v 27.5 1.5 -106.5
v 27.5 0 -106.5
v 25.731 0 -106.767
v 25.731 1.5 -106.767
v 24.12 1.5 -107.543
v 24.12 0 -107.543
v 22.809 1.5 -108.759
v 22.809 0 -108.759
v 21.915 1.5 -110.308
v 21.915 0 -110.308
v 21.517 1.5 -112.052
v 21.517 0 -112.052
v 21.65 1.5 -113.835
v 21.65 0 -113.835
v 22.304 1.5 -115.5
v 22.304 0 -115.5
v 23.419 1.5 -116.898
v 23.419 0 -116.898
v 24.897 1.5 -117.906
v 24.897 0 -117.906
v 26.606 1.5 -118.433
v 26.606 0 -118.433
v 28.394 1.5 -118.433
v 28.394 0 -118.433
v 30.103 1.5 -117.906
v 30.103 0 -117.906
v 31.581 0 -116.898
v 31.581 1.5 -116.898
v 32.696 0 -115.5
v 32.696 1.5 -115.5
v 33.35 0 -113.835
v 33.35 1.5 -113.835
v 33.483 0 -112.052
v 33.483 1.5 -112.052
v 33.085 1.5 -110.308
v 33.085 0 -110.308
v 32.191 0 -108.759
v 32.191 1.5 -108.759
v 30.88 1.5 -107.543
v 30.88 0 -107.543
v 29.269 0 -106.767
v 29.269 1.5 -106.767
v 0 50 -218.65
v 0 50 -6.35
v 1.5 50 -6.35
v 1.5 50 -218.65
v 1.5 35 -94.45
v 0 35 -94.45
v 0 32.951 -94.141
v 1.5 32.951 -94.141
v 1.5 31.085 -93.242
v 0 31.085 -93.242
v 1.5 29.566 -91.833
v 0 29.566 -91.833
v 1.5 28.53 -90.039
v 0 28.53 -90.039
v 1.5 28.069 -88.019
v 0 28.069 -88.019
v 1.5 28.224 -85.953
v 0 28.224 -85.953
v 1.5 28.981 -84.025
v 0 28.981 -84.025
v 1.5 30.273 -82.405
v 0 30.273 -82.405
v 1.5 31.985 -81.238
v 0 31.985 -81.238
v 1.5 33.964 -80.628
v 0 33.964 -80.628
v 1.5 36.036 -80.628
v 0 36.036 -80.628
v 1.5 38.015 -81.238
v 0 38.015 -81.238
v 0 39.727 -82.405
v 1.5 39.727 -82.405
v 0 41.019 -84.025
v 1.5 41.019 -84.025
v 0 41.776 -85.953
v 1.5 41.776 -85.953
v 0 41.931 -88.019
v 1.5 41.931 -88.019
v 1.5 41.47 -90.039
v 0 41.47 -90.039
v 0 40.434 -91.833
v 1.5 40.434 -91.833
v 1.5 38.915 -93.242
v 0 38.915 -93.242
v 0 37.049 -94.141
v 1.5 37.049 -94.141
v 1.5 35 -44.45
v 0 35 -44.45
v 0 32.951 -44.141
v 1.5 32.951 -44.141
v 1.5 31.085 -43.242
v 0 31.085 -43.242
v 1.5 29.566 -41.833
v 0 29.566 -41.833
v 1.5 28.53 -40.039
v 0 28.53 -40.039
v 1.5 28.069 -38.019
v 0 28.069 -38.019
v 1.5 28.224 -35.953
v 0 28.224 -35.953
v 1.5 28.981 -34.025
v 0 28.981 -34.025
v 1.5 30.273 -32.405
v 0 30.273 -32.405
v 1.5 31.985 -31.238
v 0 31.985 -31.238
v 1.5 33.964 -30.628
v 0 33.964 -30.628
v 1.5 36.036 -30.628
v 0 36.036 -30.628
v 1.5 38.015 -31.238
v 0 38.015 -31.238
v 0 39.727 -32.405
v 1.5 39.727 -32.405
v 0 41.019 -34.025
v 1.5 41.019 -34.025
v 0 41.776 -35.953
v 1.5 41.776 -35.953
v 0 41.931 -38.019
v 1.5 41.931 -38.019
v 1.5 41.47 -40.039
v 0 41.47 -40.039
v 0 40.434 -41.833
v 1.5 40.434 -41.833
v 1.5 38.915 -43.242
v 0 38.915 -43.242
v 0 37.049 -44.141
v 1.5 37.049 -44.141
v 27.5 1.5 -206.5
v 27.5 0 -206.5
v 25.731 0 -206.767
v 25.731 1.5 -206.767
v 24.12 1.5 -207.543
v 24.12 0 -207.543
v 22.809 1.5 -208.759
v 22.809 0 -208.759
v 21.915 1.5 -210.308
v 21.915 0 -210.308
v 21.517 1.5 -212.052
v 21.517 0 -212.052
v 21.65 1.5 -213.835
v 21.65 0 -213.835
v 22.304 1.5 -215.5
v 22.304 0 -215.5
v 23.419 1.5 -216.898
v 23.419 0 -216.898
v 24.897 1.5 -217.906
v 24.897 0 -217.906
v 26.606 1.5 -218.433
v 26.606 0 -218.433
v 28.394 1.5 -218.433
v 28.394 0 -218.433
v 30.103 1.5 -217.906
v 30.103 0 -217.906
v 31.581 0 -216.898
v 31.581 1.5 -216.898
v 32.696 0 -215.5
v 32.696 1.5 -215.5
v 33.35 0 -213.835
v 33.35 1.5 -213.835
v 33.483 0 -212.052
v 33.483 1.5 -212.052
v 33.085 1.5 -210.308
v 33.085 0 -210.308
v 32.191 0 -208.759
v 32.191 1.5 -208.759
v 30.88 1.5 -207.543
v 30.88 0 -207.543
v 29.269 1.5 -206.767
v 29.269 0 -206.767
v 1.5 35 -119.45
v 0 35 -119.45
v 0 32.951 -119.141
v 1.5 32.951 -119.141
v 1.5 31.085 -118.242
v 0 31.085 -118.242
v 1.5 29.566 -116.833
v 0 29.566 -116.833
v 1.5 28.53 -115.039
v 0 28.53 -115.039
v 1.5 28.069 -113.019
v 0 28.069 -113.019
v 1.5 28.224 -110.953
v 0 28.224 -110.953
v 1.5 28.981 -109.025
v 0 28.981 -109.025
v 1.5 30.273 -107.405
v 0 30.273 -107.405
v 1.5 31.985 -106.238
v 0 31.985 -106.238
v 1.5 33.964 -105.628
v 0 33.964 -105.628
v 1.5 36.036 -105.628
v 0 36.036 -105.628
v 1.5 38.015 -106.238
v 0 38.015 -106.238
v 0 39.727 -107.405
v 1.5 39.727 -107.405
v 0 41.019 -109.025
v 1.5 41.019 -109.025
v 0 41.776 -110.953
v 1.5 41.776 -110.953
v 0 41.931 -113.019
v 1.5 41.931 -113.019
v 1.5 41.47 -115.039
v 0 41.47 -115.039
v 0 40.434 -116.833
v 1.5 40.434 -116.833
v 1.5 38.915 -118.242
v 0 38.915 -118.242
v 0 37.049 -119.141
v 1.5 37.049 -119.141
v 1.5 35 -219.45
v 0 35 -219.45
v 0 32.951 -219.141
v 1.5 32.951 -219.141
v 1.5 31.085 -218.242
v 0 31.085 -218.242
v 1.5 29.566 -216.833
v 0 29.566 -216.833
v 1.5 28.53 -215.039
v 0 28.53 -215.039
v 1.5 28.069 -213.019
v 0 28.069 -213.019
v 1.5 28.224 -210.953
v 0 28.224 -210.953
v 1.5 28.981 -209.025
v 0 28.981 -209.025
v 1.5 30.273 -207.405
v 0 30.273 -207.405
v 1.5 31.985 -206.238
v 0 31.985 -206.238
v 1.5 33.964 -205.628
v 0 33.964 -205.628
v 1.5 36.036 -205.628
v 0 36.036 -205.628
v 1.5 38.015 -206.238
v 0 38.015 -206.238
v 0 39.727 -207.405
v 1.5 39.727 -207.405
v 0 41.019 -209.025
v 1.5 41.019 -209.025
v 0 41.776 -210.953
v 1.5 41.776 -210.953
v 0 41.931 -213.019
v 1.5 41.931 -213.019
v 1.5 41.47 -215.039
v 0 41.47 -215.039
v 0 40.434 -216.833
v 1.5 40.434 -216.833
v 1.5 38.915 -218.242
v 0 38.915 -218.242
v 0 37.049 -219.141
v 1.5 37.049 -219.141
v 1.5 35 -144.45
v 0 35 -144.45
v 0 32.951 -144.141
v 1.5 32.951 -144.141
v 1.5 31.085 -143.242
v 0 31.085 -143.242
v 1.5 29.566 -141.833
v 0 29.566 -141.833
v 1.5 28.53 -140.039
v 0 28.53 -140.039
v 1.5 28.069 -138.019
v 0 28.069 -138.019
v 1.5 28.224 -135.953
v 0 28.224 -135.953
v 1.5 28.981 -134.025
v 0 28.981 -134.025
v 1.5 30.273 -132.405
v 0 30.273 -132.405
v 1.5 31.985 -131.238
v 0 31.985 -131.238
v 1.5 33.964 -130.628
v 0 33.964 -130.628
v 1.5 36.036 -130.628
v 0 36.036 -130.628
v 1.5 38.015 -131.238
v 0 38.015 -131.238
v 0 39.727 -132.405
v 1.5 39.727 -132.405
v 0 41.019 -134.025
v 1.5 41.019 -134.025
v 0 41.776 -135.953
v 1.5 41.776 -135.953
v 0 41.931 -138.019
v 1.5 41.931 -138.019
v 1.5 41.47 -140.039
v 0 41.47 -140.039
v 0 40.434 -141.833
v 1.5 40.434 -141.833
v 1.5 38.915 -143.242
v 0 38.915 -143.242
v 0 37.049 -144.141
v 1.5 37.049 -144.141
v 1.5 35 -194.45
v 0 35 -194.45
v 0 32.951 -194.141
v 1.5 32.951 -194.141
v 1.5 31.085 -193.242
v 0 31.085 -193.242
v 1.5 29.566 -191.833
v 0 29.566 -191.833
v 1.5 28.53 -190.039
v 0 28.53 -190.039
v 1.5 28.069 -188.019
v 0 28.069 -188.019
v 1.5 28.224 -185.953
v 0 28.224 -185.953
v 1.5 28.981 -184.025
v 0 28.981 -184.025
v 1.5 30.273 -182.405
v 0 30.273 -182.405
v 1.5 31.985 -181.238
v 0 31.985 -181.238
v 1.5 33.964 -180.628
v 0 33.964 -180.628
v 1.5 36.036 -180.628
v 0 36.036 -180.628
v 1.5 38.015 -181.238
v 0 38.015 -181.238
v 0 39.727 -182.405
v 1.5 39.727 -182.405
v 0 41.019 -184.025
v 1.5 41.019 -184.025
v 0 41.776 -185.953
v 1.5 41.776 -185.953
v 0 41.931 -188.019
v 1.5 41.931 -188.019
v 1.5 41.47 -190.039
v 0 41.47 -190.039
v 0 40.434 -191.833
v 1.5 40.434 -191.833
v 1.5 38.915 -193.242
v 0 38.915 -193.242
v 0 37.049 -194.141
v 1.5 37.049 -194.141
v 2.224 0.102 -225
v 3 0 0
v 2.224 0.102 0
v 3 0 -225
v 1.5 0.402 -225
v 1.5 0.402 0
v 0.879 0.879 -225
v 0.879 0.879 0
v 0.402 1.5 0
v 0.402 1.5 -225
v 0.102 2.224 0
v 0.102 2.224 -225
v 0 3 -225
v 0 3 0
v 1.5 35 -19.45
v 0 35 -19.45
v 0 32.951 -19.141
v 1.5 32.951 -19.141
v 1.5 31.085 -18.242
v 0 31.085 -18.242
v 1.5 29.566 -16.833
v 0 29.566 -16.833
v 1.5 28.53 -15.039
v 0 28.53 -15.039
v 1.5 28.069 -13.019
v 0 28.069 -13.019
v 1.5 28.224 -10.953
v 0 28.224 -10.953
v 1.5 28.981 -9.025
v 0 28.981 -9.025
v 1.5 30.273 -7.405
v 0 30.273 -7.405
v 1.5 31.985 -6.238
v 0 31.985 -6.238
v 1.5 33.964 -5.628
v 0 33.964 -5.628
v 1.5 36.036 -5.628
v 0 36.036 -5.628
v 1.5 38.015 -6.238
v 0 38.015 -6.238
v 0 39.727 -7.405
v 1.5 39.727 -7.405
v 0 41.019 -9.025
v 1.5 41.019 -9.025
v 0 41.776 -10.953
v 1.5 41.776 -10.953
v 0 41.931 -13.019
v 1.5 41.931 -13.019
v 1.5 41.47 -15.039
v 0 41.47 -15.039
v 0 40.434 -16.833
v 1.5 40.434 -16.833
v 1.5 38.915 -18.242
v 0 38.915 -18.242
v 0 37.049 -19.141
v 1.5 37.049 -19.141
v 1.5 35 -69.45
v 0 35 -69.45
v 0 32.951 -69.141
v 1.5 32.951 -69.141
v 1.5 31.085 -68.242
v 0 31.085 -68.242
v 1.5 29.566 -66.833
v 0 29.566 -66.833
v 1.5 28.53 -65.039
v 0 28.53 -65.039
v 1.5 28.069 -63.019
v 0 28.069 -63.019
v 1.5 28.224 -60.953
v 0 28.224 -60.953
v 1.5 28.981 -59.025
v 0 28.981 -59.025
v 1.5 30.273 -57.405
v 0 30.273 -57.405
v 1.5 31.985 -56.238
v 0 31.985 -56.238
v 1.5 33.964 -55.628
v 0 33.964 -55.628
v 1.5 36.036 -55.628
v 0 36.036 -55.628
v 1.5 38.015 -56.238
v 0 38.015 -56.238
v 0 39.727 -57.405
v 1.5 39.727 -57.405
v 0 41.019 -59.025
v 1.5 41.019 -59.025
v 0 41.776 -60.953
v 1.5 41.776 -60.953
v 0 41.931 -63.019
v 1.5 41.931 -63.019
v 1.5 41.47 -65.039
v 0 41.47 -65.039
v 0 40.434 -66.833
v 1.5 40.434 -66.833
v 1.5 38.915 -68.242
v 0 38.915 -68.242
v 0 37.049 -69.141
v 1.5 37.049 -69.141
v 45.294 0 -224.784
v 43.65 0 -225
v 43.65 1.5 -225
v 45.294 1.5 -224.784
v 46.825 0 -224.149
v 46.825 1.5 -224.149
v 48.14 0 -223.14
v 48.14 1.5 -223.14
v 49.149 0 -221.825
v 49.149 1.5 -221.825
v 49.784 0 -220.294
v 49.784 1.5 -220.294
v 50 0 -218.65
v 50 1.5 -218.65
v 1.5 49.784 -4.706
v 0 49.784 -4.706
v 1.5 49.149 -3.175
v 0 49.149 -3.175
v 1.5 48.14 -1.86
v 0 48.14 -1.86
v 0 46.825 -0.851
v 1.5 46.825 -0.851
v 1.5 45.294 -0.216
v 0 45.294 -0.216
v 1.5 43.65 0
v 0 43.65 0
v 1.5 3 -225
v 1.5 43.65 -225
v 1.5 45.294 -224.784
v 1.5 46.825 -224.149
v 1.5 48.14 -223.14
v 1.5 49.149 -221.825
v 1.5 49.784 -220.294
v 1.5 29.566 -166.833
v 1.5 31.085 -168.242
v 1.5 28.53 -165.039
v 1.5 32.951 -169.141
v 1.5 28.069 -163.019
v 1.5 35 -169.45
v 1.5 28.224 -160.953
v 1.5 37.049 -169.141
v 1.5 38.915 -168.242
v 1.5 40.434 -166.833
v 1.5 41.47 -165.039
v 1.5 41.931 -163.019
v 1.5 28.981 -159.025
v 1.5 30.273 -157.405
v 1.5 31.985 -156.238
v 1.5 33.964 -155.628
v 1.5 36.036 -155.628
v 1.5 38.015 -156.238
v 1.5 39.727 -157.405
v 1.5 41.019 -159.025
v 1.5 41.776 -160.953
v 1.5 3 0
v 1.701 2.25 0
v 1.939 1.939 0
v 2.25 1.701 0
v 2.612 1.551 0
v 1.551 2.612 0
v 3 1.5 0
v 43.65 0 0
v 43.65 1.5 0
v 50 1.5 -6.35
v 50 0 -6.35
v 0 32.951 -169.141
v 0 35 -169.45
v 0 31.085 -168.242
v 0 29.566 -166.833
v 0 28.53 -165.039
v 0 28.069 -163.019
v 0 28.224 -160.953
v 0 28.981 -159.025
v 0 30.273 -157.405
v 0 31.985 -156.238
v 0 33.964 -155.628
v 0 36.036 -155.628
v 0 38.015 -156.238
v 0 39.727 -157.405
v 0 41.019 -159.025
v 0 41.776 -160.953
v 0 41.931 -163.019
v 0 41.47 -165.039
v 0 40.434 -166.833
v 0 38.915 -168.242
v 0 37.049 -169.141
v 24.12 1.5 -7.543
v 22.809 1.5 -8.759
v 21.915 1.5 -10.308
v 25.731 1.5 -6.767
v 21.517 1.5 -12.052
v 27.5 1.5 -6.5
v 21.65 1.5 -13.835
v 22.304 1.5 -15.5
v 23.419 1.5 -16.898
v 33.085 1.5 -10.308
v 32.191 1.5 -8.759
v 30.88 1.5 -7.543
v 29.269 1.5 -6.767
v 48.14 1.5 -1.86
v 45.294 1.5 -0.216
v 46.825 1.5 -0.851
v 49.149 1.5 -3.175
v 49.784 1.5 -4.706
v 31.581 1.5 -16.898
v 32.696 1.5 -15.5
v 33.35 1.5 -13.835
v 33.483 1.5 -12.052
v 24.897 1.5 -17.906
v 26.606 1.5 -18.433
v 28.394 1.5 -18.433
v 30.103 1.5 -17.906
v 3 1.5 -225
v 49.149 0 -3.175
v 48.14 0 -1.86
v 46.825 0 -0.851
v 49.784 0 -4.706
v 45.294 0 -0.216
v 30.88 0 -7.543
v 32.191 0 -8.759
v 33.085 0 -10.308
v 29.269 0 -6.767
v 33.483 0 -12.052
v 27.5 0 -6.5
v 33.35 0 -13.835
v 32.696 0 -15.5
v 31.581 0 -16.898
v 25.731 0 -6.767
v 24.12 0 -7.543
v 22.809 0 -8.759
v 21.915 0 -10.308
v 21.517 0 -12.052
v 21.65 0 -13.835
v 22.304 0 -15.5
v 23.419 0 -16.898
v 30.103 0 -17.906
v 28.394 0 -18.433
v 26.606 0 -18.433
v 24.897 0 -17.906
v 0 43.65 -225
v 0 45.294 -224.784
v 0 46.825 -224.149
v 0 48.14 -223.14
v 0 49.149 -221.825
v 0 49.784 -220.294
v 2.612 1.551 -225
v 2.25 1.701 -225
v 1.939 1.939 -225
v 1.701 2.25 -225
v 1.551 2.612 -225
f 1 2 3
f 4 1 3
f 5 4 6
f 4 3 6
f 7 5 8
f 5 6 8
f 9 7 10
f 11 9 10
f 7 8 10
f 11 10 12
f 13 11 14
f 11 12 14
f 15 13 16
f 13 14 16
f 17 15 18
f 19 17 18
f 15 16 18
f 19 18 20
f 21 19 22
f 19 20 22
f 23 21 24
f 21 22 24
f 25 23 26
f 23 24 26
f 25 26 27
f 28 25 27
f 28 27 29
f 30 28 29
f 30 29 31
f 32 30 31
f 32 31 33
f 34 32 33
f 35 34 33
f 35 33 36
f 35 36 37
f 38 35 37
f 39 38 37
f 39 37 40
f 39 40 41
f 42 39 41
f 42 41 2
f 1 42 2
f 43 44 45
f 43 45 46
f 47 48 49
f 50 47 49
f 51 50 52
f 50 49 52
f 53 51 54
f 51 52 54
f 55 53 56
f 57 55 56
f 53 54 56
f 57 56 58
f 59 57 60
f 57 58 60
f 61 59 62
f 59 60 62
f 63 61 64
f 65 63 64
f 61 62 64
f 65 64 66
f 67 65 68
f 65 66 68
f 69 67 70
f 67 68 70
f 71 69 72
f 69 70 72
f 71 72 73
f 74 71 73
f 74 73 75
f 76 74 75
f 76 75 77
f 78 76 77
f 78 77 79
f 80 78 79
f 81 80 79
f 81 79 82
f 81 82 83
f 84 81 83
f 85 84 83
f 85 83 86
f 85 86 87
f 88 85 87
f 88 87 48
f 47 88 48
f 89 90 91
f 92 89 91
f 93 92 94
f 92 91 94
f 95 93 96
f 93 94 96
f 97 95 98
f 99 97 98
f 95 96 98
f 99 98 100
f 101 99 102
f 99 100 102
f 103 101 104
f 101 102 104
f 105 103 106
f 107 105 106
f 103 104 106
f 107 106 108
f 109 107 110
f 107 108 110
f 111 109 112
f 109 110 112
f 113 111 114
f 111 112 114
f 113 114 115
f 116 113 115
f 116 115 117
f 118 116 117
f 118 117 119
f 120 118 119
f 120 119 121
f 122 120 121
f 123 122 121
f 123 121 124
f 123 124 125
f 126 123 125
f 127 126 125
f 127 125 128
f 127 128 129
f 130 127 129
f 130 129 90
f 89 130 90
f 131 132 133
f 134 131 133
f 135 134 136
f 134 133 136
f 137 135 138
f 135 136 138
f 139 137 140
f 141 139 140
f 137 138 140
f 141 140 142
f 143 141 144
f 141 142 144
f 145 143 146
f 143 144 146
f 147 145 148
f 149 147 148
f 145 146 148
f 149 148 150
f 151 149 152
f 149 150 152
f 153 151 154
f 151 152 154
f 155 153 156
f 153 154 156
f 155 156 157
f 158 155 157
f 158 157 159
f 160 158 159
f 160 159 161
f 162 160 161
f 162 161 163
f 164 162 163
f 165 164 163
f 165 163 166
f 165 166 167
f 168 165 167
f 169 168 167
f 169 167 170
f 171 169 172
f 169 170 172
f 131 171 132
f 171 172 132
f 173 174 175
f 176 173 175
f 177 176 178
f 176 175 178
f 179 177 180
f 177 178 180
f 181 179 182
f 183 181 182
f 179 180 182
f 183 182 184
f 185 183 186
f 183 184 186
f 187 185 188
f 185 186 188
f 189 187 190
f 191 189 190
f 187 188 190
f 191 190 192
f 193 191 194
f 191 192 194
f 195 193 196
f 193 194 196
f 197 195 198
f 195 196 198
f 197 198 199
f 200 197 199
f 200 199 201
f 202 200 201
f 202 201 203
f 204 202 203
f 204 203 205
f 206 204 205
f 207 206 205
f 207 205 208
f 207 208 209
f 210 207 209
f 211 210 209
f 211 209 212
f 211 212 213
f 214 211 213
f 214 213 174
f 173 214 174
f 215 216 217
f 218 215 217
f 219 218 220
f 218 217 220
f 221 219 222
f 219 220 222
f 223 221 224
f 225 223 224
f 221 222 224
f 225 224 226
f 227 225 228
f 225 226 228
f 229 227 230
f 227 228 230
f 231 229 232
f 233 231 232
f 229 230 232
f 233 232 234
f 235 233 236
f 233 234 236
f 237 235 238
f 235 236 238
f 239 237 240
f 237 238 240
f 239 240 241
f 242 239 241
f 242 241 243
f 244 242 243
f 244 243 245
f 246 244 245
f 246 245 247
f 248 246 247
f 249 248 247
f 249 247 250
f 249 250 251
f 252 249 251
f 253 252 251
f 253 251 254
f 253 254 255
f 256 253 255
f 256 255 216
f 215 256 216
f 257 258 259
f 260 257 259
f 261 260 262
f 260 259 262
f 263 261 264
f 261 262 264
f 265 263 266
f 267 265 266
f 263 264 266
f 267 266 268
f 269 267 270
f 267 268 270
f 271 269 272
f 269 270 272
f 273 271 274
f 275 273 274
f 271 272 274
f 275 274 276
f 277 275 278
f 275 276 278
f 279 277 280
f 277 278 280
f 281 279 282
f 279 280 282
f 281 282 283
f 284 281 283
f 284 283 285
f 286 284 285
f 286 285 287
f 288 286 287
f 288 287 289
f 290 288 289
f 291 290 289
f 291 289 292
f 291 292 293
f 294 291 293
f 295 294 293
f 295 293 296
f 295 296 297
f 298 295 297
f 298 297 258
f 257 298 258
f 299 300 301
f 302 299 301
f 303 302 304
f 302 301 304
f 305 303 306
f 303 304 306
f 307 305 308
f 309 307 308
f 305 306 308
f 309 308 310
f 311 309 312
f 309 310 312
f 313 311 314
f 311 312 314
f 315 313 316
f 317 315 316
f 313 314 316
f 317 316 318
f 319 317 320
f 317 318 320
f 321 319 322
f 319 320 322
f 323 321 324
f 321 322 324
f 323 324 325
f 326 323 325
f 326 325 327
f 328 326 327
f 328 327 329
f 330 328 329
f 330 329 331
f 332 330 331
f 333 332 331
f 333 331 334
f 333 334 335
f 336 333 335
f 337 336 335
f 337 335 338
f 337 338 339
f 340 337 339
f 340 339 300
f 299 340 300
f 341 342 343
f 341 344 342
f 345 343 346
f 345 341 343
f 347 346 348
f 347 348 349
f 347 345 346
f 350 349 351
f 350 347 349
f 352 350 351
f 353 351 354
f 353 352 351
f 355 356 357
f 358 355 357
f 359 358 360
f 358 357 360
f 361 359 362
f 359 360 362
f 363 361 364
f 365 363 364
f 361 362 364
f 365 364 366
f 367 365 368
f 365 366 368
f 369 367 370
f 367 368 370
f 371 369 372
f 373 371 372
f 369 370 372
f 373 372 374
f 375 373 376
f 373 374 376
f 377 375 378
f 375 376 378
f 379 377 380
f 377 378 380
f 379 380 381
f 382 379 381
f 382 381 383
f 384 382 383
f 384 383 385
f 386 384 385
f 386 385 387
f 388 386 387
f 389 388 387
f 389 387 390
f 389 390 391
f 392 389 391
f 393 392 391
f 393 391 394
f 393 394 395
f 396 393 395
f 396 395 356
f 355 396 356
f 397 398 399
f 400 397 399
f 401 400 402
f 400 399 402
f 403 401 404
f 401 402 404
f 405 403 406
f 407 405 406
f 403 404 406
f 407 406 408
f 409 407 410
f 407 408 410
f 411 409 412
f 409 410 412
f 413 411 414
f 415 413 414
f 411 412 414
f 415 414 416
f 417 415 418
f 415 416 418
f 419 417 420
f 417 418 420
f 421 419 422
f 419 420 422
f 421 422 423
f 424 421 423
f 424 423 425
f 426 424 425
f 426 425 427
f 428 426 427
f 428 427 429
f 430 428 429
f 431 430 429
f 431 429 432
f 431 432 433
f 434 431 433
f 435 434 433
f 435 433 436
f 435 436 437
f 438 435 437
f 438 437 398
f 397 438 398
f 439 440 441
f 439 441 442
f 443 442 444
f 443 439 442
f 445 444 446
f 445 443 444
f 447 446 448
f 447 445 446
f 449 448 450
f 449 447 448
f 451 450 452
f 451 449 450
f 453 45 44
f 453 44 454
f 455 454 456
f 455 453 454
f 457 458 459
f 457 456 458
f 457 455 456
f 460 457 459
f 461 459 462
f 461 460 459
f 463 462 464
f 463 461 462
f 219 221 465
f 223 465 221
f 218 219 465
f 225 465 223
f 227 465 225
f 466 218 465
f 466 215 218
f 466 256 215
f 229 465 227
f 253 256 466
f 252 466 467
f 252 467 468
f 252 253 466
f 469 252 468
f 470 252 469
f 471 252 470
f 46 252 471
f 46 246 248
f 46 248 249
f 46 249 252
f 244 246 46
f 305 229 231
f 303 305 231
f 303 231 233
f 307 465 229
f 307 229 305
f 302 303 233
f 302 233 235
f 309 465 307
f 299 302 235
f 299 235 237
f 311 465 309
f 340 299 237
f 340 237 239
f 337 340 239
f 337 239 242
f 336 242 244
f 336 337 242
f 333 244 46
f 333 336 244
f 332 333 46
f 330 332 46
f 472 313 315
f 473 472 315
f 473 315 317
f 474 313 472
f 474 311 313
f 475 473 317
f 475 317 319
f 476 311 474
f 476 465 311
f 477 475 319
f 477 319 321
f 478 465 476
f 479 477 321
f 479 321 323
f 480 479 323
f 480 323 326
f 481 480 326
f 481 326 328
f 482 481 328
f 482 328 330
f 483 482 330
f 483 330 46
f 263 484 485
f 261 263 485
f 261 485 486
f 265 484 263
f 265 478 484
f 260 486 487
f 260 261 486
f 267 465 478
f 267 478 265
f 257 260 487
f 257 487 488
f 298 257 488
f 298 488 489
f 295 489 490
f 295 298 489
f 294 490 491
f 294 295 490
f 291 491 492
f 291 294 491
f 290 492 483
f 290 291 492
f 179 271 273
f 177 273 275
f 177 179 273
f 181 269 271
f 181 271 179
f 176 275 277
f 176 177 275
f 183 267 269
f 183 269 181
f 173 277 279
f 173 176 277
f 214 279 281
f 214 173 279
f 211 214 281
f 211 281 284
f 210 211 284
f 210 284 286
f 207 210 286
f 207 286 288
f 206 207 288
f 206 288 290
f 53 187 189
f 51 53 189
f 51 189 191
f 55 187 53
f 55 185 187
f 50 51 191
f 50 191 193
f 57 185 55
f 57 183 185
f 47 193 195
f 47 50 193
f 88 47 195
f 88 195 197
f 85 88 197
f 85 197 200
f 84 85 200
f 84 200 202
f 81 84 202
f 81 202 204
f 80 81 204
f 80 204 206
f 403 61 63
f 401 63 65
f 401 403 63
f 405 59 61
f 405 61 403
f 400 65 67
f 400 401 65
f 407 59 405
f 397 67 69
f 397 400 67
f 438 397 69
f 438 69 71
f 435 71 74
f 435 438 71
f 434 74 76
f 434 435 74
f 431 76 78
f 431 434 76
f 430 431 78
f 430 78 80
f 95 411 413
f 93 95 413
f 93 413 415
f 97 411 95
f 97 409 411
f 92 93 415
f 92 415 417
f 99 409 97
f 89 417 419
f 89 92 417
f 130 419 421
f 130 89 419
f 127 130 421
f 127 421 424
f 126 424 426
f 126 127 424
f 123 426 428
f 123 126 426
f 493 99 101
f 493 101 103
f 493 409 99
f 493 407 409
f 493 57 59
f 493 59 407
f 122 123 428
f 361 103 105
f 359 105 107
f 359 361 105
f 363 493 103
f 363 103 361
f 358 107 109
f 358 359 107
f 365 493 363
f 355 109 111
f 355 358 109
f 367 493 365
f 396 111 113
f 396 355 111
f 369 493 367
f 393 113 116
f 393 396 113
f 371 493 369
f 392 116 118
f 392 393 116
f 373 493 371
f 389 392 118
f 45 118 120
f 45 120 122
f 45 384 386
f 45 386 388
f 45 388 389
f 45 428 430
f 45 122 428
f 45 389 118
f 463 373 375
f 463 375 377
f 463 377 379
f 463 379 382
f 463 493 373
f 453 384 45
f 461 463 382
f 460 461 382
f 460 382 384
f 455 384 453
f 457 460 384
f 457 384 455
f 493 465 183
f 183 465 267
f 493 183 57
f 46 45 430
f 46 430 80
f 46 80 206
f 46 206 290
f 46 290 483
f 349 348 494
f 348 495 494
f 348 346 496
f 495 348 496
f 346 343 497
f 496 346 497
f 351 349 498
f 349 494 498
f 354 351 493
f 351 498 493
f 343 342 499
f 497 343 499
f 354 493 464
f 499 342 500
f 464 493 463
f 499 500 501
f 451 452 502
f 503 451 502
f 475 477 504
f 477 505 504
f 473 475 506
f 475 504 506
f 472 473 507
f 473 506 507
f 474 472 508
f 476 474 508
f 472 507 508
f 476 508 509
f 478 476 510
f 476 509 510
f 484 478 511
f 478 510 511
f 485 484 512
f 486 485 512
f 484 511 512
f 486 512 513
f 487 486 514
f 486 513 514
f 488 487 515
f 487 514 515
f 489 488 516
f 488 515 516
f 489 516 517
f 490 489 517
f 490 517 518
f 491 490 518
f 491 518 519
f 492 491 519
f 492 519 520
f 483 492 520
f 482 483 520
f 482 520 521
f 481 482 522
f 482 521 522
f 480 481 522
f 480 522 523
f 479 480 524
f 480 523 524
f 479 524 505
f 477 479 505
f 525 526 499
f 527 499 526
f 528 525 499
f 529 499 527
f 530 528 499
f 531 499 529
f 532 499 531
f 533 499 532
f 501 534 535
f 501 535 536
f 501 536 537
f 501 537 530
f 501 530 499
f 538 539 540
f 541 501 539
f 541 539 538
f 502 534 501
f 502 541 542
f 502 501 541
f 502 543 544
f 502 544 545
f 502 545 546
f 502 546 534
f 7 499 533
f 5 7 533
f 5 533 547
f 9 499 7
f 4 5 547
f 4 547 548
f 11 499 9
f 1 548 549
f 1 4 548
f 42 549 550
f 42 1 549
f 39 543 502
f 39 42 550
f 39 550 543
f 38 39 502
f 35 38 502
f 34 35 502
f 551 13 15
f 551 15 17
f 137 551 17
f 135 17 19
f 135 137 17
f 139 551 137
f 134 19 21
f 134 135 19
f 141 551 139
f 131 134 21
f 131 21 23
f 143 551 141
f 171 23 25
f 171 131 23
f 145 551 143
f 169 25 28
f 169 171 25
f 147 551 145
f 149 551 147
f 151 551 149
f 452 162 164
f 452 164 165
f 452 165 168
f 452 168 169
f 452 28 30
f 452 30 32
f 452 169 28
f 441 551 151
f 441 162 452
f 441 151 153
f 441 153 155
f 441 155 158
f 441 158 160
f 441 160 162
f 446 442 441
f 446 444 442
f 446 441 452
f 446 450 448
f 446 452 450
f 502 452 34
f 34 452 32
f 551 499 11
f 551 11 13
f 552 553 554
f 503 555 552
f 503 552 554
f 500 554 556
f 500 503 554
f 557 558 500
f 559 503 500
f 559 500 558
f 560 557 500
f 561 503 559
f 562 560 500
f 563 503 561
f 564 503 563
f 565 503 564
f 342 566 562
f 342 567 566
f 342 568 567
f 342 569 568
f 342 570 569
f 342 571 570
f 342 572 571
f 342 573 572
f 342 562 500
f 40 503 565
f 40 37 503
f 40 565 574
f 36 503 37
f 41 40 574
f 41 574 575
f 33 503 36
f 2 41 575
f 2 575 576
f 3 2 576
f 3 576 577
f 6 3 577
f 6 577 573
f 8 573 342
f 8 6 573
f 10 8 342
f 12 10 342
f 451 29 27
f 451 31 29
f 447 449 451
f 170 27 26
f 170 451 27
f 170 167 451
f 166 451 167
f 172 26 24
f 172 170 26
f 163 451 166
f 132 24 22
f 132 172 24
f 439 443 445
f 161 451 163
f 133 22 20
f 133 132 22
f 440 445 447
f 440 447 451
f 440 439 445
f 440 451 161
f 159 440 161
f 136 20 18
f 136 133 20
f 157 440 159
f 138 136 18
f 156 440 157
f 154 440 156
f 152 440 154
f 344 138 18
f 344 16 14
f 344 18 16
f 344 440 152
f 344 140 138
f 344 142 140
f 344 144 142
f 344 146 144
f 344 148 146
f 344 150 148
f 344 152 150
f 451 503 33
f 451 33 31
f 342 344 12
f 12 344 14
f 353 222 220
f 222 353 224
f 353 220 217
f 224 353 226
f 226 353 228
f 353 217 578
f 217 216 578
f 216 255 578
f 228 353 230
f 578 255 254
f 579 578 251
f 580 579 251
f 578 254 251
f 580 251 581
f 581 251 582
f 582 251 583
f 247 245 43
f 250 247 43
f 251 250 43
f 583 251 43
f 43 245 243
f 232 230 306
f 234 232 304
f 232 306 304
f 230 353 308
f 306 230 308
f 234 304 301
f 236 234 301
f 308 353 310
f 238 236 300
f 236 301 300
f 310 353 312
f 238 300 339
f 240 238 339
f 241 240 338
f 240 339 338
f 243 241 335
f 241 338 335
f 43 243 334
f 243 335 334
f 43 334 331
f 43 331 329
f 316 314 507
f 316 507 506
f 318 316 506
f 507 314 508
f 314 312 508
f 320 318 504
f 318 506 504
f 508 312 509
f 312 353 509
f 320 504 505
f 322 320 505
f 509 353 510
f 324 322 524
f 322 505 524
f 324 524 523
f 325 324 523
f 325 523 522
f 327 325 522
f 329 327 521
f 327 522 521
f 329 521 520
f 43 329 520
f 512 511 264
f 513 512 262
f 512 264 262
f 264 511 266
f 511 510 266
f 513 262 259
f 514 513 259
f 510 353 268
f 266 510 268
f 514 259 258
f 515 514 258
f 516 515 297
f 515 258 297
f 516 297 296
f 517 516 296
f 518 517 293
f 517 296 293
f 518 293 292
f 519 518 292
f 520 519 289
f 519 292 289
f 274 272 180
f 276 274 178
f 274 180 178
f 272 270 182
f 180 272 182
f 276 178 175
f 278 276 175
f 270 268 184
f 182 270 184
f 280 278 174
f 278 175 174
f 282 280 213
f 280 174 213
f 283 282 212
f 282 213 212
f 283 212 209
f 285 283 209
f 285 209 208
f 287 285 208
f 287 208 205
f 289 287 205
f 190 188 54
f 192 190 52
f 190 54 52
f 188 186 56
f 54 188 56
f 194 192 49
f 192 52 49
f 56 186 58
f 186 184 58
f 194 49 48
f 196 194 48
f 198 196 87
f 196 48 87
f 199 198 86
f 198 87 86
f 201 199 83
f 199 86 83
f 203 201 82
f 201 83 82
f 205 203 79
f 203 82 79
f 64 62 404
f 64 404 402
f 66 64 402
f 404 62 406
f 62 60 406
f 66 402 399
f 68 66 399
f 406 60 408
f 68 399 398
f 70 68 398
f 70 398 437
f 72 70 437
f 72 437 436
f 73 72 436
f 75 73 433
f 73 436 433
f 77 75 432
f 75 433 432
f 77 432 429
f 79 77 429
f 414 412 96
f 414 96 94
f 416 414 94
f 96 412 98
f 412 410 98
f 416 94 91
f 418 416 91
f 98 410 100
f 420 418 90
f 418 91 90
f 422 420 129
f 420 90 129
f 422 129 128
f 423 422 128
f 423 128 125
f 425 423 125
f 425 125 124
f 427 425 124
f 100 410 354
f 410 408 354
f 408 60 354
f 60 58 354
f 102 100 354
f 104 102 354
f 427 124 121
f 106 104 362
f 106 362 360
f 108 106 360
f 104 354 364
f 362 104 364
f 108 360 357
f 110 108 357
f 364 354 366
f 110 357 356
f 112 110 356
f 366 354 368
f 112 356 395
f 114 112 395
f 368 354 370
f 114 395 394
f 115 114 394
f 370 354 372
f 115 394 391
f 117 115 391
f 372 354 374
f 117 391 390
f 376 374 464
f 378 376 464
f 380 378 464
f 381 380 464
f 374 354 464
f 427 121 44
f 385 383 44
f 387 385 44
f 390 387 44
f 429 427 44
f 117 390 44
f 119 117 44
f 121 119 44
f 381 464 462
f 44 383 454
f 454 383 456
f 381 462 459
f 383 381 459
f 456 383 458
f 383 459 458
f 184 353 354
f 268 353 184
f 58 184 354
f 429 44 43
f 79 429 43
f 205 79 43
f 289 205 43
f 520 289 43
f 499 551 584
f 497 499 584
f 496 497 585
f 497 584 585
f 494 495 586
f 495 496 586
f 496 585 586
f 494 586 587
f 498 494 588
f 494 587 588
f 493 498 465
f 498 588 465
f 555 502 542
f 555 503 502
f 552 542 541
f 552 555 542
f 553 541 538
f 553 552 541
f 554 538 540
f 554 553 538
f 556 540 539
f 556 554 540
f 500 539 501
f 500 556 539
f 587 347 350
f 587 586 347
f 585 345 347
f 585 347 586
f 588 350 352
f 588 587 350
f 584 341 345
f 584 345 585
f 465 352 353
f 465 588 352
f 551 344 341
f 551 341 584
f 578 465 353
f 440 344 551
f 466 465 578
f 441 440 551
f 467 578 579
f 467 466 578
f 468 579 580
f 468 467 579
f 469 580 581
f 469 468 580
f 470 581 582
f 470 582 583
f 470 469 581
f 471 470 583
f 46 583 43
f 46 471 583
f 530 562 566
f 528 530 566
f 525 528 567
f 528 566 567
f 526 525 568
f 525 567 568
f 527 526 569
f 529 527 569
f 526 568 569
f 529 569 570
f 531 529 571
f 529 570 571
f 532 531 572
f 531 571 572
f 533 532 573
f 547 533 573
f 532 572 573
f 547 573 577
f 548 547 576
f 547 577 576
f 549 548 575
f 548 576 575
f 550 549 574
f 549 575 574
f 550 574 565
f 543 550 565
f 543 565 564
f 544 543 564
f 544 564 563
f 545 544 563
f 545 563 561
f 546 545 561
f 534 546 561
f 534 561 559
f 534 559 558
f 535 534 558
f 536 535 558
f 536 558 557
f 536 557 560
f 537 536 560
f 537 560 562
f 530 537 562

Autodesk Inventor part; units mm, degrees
ref_plane "YZ Plane" through (0, 0, 0) normal (1, 0, 0) x (0, 1, 0)
ref_plane "XZ Plane" through (0, 0, 0) normal (0, 1, 0) x (-1, 0, 0)
ref_plane "XY Plane" through (0, 0, 0) normal (0, 0, 1) x (1, 0, 0)
sketch "Sketch2" plane through (0, 0, 0) normal (1, 0, 0) x (0, 1, 0)
  line L0 (0, 0) -> (50, 0)
  line L1 (50, 0) -> (50, -225)
  line L2 (50, -225) -> (0, -225)
  line L3 (0, -225) -> (0, 0)
  dimension "d0" = 50
  dimension "d1" = 225
extrude "Plate1" add sketch "Sketch2" along normal blind 1.5
sketch "Sketch3" plane through (0, 1.5, -225) normal (0, -1, 0) x (1, 0, 0)
  line L0 (0, 225) -> (0, 0)
  line L1 (0, 0) -> (25.4, 0)
  line L2 (25.4, 0) -> (25.4, 225)
  line L3 (25.4, 225) -> (0, 225)
edge flange "Flange1" height 25.4 angle 90 thickness 1.5 bend radius 1.5 thickness toward (0, -1, 0) relief tear relief width 1.5 relief depth 0.75 edges at (1.5, 0, -112.5) wall of the first edge with corners at (0, 1.5, 0) (0, 1.5, -225) (25.4, 1.5, -225) (25.4, 1.5, 0)
bend "Bend1"
corner "Corner1"
sketch "Sketch4" plane through (25.4, 1.5, 0) normal (0, 1, 0) x (1, 0, 0)
  line L0 (-25.4, 0) -> (24.6, 0)
  line L1 (-22.4, 0) -> (0, 0)
  line L2 (-25.4, 0) -> (24.6, 0) construction
  line L3 (0, 225) -> (-22.4, 225)
  line L4 (24.6, 0) -> (-22.4, 0)
  line L5 (-22.4, 0) -> (-22.4, 225)
  line L6 (-22.4, 225) -> (24.6, 225)
  line L7 (24.6, 225) -> (24.6, 0)
  dimension "d13" = 50
  dimension "d14" = 0
sheet face with bend "Face2" sketch "Sketch4" thickness 1.5 toward (0, -1, 0) bend radius 1.5
bend "Bend2"
sketch "Sketch5" plane through (0, 50, 0) normal (0, 0, 1) x (1, 0, 0)
  point P0 (0, -50)
sketch "Sketch6" plane through (3, 1.5, 0) normal (0, 1, 0) x (1, 0, 0)
  line L0 (47, 225) -> (47, 0) projected
  line L1 (0, 0) -> (47, 0) projected
  line L2 (47, 225) -> (24.5, 225)
  line L3 (24.5, 225) -> (24.5, 0)
  line L4 (24.5, 0) -> (47, 0)
  line L5 (47, 0) -> (47, 225)
  circle A0 centre (24.5, 112.5) radius 6
  line L6 (24.5, 112.5) -> (24.5, 12.5)
  line L7 (24.5, 112.5) -> (124.5, 112.5) construction
  line L8 (24.5, 112.5) -> (24.5, 212.5)
  line L9 (24.5, 112.5) -> (124.5, 112.5) construction
  circle A1 centre (24.5, 212.5) radius 6
  circle A2 centre (24.5, 12.5) radius 6
  point P0 (-3, 0)
  dimension "d20" = 22.5
  dimension "d21" = 12
  dimension "d22" = 100
  dimension "d23" = 90
  dimension "d24" = 100
  dimension "d25" = 90
  dimension "d26" = 12
  dimension "d27" = 12
hole "Hole1" at (27.5, 1.5, -12.5) at (27.5, 1.5, -112.5) at (27.5, 1.5, -212.5) direction (0, -1, 0) diameter 12 end through all clearance for "Flat Head Machine Screw" size "M10" standard "Ansi Metric M Profile"
fillet "Corner Round1" radius 6.35 4 edges at (50, 0.75, 0) (50, 0.75, -225) (0.75, 50, -225) (0.75, 50, 0)
sketch "Sketch7" plane through (1.5, 0, 0) normal (1, 0, 0) x (0, 0, -1)
  arc A0 (6.35, 50) -> (0, 43.65) centre (6.35, 43.65) ccw projected
  circle A1 centre (112.5, 35) radius 6.95
  line L0 (112.5, 35) -> (87.5, 35)
  line L1 (87.5, 35) -> (62.5, 35)
  line L2 (62.5, 35) -> (37.5, 35)
  line L3 (37.5, 35) -> (12.5, 35)
  circle A2 centre (12.5, 35) radius 6.95
  circle A3 centre (37.5, 35) radius 6.95
  circle A4 centre (62.5, 35) radius 6.95
  circle A5 centre (87.5, 35) radius 6.95
  line L4 (112.5, 35) -> (137.5, 35)
  line L5 (137.5, 35) -> (162.5, 35)
  line L6 (162.5, 35) -> (187.5, 35)
  line L7 (187.5, 35) -> (212.5, 35)
  circle A6 centre (137.5, 35) radius 6.95
  circle A7 centre (162.5, 35) radius 6.95
  circle A8 centre (187.5, 35) radius 6.95
  circle A9 centre (212.5, 35) radius 6.95
  point P0 (0, 0)
  dimension "d38" = 13.9
  dimension "d43" = 25
  dimension "d44" = 25
  dimension "d45" = 25
  dimension "d46" = 25
  dimension "d47" = 13.9
  dimension "d48" = 13.9
  dimension "d49" = 13.9
  dimension "d50" = 13.9
  dimension "d51" = 25
  dimension "d52" = 25
  dimension "d53" = 25
  dimension "d54" = 180
  dimension "d55" = 25
  dimension "d56" = 13.9
  dimension "d57" = 13.9
  dimension "d58" = 13.9
  dimension "d59" = 13.9
hole "Hole2" at (1.5, 35, -12.5) at (1.5, 35, -37.5) at (1.5, 35, -62.5) at (1.5, 35, -87.5) at (1.5, 35, -112.5) at (1.5, 35, -137.5) at (1.5, 35, -162.5) at (1.5, 35, -187.5) at (1.5, 35, -212.5) direction (-1, 0, 0) diameter 13.9 end through all
equation "\"d2\" = Thickness"
equation "\"d3\" = BendReliefWidth"
equation "\"d4\" = BendReliefDepth"
equation "\"d5\" = MinimumRemnant"
equation "\"d6\" = TransitionRadius"
equation "\"d9\" = BendRadius"
equation "\"d10\" = CornerReliefSize"
equation "\"d11\" = GapSize"
equation "\"d12\" = JacobiRadiusSize"
equation "\"d15\" = BendRadius"
equation "\"d16\" = BendReliefWidth"
equation "\"d18\" = MinimumRemnant"
equation "\"d17\" = BendReliefDepth"
equation "\"d19\" = TransitionRadius"
equation "\"BendRadius\" = Thickness"
equation "\"BendReliefWidth\" = Thickness"
equation "\"BendReliefDepth\" = 0.5 * Thickness"
equation "\"CornerReliefSize\" = 4 * Thickness"
equation "\"MinimumRemnant\" = 2 * Thickness"
equation "\"TransitionRadius\" = BendRadius"
equation "\"JacobiRadiusSize\" = BendRadius"
equation "\"GapSize\" = Thickness"
equation "\"Thickness\" = 1.5"
properties part number "Mounting_bracket"
